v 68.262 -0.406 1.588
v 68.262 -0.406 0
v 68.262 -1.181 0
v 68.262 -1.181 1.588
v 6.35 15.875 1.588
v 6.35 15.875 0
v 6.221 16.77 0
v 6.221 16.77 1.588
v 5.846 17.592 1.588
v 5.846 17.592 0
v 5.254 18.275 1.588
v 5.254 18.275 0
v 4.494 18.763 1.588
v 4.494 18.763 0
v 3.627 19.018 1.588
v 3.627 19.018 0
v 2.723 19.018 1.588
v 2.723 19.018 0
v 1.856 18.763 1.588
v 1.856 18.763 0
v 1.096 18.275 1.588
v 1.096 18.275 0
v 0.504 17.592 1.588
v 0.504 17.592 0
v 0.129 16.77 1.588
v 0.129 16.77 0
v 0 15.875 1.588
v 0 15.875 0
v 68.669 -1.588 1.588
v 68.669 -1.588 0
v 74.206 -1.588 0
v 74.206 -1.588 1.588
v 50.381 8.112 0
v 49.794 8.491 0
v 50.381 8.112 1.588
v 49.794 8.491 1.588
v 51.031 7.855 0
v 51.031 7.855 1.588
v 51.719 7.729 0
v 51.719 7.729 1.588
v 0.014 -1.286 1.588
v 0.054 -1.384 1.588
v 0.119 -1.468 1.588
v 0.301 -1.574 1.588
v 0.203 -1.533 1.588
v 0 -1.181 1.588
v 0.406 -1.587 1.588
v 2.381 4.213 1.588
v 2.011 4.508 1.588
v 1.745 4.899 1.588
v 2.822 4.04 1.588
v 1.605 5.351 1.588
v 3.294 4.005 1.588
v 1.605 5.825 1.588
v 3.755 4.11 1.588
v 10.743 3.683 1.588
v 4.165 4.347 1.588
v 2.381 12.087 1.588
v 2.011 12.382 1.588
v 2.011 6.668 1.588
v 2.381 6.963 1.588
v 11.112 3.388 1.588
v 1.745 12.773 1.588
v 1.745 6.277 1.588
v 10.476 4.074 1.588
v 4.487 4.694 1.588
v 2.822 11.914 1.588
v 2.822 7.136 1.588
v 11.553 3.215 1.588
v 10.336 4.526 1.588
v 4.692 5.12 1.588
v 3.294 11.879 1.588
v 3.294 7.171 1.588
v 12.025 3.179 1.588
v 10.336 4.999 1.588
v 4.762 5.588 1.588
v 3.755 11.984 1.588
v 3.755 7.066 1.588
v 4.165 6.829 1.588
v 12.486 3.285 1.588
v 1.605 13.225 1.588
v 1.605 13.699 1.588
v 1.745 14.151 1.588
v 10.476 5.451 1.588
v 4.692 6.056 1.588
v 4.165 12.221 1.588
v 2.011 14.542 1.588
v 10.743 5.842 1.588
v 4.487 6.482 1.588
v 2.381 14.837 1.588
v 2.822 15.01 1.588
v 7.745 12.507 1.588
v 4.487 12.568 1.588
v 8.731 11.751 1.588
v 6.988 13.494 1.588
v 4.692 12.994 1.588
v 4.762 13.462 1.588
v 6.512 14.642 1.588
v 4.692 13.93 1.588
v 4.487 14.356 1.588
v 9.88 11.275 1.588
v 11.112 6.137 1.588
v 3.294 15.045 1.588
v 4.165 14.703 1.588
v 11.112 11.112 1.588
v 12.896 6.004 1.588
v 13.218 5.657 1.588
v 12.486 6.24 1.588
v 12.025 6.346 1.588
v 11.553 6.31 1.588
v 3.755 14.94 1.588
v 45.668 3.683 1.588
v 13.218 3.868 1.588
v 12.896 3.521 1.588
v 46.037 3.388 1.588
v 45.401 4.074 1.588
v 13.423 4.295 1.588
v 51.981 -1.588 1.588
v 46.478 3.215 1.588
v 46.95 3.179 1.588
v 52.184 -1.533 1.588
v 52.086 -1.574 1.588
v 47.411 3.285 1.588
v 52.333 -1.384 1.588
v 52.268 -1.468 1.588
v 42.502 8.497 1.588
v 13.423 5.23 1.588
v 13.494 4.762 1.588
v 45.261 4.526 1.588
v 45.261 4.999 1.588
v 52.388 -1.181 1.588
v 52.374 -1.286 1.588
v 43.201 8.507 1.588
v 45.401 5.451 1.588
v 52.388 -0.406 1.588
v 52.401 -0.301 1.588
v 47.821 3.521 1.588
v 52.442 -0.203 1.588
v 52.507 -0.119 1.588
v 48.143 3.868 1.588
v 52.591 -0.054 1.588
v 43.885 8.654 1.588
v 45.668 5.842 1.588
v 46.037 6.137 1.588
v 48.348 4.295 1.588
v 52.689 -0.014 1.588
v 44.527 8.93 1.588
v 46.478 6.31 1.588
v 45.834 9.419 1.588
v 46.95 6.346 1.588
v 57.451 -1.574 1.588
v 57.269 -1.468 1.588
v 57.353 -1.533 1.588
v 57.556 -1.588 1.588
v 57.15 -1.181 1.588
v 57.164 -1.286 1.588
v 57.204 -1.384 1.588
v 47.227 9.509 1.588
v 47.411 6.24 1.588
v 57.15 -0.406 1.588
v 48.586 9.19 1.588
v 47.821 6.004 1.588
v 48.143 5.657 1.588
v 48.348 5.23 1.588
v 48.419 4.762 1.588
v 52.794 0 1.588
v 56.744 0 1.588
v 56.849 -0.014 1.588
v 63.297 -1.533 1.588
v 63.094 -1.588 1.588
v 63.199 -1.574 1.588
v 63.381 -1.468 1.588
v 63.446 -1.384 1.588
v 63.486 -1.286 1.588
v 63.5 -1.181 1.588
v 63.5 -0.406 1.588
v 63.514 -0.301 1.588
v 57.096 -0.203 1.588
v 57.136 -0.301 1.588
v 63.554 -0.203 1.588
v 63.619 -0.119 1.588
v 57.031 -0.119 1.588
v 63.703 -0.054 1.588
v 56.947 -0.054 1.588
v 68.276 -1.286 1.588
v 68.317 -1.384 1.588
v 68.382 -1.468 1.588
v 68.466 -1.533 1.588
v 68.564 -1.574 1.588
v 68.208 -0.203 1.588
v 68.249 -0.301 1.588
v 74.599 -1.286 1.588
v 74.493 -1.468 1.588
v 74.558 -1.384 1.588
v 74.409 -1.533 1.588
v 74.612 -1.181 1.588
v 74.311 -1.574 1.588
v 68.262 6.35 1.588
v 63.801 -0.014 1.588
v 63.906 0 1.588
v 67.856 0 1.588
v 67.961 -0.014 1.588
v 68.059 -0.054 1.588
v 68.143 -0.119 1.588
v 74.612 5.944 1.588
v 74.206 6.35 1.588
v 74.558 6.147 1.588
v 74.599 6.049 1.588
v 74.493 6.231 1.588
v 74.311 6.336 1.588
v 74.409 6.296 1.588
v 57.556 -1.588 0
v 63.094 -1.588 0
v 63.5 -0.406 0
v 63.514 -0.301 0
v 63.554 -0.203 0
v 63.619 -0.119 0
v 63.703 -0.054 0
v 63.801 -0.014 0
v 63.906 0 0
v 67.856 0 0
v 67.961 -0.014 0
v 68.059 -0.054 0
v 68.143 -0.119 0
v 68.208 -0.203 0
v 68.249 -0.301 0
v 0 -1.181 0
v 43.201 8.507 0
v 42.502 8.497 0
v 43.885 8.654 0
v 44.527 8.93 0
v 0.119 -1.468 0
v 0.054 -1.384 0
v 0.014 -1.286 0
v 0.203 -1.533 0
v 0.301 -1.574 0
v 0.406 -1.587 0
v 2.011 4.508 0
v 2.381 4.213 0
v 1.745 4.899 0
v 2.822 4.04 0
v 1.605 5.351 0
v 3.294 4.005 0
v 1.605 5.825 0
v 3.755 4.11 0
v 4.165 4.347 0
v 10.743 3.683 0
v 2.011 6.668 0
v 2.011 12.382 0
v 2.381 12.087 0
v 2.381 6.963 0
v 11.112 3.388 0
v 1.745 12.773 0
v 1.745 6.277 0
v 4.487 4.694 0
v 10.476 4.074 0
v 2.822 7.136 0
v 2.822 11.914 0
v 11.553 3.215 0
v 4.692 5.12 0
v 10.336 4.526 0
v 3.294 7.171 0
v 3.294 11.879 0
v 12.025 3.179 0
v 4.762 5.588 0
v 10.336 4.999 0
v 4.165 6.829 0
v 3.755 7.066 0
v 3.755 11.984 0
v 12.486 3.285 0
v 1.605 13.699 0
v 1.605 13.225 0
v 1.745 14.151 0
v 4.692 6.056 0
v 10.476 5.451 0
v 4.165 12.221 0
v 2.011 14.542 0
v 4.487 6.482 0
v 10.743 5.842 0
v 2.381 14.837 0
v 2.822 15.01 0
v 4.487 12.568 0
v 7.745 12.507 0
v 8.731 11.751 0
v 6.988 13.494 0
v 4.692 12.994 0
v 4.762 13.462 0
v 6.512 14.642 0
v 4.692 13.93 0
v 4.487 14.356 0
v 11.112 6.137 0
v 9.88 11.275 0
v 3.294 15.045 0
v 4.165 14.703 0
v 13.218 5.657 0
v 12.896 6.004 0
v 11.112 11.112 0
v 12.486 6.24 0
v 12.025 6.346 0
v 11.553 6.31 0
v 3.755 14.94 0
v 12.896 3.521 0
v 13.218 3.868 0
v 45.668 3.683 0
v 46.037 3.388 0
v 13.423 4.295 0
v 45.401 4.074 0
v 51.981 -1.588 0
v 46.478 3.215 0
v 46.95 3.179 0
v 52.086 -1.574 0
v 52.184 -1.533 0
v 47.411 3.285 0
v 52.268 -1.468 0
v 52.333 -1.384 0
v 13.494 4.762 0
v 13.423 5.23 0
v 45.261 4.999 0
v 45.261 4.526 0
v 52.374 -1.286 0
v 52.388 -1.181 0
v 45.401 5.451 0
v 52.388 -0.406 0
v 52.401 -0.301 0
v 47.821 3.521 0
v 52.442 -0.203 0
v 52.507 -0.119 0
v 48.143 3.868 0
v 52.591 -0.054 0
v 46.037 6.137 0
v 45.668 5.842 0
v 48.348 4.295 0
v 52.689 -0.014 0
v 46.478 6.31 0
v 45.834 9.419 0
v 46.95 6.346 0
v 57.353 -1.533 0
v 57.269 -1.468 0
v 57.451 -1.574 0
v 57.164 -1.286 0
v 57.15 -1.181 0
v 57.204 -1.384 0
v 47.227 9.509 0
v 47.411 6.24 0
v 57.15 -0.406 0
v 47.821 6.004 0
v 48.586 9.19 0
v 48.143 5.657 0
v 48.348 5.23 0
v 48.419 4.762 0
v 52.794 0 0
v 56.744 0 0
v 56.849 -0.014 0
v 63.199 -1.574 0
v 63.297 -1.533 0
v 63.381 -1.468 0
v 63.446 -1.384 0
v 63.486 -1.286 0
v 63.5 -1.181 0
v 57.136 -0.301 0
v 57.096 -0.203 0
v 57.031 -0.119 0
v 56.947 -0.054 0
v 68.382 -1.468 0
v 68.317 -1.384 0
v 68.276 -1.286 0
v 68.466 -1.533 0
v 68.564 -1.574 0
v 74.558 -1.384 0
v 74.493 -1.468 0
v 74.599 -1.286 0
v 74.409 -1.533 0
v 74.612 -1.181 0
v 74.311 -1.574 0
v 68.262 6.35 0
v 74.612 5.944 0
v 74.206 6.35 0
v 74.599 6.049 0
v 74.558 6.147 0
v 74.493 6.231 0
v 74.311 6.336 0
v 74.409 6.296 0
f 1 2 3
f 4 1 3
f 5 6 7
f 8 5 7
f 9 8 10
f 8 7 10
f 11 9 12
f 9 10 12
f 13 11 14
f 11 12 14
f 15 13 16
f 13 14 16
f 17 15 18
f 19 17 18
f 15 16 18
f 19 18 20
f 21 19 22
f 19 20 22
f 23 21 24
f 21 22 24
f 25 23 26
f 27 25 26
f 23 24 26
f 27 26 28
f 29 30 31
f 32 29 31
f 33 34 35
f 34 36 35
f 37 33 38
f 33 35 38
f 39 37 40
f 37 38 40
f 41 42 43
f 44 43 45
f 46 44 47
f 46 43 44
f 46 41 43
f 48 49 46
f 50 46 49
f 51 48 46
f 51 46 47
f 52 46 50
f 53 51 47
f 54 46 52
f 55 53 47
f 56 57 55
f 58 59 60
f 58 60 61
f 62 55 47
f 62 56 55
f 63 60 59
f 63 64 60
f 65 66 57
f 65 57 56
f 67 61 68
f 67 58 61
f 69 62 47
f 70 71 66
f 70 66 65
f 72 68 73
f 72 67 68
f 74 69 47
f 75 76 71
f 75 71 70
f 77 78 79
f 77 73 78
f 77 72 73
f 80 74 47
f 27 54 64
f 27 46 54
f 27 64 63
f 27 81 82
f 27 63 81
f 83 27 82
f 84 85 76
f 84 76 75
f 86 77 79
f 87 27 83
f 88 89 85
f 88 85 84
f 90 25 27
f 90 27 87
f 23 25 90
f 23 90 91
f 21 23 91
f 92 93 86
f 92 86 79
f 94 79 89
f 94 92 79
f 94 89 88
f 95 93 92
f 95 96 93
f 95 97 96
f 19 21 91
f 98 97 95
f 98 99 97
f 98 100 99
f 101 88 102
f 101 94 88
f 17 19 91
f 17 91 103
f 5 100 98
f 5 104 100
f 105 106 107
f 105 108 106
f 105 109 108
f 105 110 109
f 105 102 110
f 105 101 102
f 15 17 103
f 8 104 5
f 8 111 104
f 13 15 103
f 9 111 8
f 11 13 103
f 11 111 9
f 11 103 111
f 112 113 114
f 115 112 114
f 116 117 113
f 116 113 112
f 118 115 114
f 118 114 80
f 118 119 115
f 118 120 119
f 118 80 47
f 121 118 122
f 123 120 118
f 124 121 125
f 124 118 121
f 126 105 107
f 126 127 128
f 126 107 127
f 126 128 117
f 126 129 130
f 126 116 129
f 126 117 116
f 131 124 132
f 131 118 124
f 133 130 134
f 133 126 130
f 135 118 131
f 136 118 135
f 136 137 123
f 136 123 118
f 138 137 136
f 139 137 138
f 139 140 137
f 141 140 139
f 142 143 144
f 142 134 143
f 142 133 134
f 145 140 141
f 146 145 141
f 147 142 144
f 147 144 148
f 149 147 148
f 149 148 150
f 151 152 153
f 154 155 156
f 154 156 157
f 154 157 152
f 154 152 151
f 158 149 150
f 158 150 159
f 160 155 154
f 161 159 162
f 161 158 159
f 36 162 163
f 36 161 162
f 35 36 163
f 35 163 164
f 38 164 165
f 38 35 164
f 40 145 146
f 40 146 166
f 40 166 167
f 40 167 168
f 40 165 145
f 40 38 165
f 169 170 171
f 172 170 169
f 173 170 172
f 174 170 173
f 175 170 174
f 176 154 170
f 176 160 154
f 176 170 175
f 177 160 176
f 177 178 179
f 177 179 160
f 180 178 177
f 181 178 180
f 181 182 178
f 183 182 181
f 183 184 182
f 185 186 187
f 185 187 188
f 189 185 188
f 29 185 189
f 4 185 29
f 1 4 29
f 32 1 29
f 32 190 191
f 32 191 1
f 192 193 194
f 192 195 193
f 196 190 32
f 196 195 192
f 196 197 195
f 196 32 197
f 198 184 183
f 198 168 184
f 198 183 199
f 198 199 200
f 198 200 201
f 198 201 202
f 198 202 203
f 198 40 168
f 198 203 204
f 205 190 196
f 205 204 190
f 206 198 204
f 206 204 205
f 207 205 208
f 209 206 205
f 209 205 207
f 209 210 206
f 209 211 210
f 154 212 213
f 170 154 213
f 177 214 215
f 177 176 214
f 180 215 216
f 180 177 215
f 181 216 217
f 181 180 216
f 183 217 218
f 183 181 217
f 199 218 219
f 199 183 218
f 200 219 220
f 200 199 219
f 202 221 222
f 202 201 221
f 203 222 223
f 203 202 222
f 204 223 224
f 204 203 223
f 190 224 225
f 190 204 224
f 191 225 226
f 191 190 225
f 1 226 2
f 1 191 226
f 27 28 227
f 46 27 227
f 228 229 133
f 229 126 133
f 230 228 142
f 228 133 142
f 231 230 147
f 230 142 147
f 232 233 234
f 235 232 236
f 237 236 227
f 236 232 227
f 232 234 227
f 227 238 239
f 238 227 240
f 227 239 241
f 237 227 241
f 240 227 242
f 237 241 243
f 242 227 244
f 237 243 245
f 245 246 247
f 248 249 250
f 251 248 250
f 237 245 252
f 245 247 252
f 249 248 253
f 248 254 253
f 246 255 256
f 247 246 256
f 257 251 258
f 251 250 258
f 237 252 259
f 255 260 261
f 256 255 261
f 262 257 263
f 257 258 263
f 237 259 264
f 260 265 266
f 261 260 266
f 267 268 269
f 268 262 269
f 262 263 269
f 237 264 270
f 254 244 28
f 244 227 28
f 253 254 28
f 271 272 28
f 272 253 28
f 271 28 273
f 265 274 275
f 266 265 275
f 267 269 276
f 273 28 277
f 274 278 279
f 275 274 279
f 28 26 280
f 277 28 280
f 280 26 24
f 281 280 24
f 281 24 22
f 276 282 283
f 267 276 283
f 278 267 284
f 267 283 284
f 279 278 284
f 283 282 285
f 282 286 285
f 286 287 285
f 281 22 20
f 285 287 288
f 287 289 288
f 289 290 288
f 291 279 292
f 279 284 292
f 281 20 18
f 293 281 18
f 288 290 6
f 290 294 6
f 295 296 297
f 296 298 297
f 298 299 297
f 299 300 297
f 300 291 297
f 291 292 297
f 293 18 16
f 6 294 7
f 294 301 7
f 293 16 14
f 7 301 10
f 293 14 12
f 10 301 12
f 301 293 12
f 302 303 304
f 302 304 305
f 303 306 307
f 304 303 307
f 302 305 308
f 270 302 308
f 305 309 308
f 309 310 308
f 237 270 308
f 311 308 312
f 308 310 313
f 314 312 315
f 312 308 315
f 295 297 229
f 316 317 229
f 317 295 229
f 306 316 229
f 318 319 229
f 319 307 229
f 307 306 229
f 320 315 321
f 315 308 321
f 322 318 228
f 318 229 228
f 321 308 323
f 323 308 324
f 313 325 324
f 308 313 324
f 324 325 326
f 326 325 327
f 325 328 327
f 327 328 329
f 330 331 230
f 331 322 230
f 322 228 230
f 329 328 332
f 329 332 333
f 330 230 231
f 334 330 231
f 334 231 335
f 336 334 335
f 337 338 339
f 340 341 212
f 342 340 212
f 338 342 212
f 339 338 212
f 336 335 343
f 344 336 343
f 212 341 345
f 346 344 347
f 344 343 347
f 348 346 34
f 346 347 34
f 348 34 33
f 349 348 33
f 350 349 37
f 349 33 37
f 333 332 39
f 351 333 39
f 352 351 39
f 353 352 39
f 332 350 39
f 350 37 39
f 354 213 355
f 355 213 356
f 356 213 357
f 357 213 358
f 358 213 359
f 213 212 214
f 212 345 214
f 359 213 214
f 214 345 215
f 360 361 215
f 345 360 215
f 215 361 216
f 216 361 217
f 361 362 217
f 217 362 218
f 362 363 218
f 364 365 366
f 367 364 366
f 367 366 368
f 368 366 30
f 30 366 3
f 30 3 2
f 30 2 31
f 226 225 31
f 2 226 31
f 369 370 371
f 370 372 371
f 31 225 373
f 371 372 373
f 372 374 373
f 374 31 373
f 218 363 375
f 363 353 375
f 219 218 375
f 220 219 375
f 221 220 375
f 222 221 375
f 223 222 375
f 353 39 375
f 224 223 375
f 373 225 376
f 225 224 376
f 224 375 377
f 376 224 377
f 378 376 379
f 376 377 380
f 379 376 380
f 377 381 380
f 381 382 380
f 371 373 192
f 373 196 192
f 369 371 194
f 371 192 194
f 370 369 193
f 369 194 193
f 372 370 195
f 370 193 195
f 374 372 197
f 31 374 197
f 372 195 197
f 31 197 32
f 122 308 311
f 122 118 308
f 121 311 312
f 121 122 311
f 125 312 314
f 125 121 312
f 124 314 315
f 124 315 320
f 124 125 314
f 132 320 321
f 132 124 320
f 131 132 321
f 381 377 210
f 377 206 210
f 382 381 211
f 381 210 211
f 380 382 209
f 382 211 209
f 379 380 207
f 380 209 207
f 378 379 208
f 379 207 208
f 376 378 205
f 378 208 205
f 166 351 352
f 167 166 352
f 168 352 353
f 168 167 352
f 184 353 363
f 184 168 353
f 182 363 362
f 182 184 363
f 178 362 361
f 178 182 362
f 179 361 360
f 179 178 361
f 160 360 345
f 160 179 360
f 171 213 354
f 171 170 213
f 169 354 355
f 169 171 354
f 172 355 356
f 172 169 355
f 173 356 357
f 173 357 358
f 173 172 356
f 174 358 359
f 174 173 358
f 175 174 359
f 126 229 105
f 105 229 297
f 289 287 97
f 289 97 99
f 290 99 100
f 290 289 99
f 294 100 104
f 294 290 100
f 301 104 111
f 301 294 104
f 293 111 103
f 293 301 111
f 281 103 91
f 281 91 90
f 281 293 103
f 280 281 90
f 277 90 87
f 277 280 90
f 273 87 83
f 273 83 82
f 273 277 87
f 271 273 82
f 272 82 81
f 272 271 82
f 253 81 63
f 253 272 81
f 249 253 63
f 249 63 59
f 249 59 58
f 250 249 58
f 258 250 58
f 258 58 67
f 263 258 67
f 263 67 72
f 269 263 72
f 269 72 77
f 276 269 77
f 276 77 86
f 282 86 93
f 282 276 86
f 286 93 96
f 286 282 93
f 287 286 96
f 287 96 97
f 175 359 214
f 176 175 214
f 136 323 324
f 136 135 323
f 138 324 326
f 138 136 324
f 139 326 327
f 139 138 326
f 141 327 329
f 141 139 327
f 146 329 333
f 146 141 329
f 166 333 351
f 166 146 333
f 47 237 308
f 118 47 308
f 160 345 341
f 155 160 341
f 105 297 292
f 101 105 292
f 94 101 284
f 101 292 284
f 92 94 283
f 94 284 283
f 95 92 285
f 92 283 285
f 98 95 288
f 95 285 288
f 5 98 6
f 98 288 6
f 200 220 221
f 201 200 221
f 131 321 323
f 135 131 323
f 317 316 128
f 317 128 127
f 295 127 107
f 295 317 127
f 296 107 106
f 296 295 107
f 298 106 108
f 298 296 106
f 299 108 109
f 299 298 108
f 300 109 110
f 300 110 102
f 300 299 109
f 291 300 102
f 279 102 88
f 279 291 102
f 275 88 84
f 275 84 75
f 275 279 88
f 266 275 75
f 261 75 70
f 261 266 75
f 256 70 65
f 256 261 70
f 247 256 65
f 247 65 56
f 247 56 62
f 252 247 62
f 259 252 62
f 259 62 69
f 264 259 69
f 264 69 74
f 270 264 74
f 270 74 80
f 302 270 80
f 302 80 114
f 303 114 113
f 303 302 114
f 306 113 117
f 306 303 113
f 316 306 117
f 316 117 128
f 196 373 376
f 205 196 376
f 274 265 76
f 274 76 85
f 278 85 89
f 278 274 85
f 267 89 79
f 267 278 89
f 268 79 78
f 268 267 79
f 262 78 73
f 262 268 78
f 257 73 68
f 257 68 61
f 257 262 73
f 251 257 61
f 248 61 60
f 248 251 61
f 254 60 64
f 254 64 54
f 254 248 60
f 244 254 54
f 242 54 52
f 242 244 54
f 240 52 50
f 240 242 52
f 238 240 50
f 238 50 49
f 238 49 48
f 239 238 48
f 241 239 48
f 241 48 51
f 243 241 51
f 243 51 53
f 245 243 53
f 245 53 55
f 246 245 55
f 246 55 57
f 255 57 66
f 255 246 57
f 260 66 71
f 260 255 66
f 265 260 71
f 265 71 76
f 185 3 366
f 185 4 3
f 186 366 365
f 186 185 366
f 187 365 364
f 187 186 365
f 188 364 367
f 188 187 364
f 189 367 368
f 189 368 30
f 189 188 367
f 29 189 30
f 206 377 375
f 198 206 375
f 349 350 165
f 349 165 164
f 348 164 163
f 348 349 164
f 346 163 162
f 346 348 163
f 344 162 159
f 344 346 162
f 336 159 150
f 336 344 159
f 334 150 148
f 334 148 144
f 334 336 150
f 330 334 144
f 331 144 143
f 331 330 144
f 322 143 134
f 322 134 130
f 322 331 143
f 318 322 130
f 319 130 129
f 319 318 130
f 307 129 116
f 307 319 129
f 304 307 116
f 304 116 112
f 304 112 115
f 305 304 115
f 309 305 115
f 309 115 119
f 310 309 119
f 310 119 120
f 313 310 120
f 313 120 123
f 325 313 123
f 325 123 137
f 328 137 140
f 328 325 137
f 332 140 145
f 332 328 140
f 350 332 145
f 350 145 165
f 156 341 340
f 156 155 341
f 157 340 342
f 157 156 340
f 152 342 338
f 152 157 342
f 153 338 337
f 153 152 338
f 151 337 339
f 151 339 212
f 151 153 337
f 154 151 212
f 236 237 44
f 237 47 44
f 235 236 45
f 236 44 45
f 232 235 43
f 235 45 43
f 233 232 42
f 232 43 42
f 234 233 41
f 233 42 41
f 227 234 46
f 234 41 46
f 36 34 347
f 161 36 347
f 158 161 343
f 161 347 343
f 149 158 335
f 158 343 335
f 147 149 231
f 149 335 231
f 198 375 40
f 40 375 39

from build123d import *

# Parameters (mm, degrees)
SKETCH1_R           = 1.5875
BOSS_EXTRUDE1_DEPTH = 1.5875
FILLET1_R           = 0.4064
FILLET2_R           = 3.571875


with BuildPart() as part:
    # Sketch1 → Boss-Extrude1 (new body)
    with BuildSketch(Plane.XY):
        with BuildLine():
            Line((0, -1.5875), (52.3875, -1.5875))
            Line((52.3875, -1.5875), (52.3875, 0))
            Line((52.3875, 0), (57.15, 0))
            Line((57.15, 0), (57.15, -1.5875))
            Line((57.15, -1.5875), (63.5, -1.5875))
            Line((63.5, -1.5875), (63.5, 0))
            Line((63.5, 0), (68.2625, 0))
            Line((68.2625, 0), (68.2625, -1.5875))
            Line((68.2625, -1.5875), (74.6125, -1.5875))
            Line((74.6125, -1.5875), (74.6125, 6.35))
            Line((74.6125, 6.35), (68.2625, 6.35))
            Line((68.2625, 6.35), (50.472175754, 7.832527021))
            ThreePointArc((50.472175754, 7.832527021), (47.226754098, 9.508549174), (43.748686315, 8.392817807))
            Line((43.748686315, 8.392817807), (11.1125, 11.1125))
            ThreePointArc((11.1125, 11.1125), (7.744903955, 12.507403955), (6.35, 15.875))
            ThreePointArc((6.35, 15.875), (3.175, 19.05), (0, 15.875))
            Line((0, 15.875), (0, -1.5875))
        make_face()
        with Locations((3.175, 5.588)):
            Circle(SKETCH1_R, mode=Mode.SUBTRACT)
        with Locations((3.175, 13.462)):
            Circle(SKETCH1_R, mode=Mode.SUBTRACT)
        with Locations((11.90625, 4.7625)):
            Circle(SKETCH1_R, mode=Mode.SUBTRACT)
        with Locations((46.83125, 4.7625)):
            Circle(SKETCH1_R, mode=Mode.SUBTRACT)
    extrude(amount=BOSS_EXTRUDE1_DEPTH)

    # Fillet1
    fillet1_edges = [part.edges().sort_by_distance(p)[0] for p in [
        (68.2625, 6.35, 0.79375),
        (74.6125, 6.35, 0.79375),
        (74.6125, -1.5875, 0.79375),
        (68.2625, -1.5875, 0.79375),
        (68.2625, 0, 0.79375),
        (63.5, 0, 0.79375),
        (63.5, -1.5875, 0.79375),
        (57.15, -1.5875, 0.79375),
        (57.15, 0, 0.79375),
        (52.3875, 0, 0.79375),
        (52.3875, -1.5875, 0.79375),
        (0, -1.5875, 0.79375),
    ]]
    fillet(fillet1_edges, radius=FILLET1_R)

    # Fillet2
    fillet2_edges = [part.edges().sort_by_distance(p)[0] for p in [
        (43.748686315, 8.392817807, 0.79375),
        (50.472175754, 7.832527021, 0.79375),
    ]]
    fillet(fillet2_edges, radius=FILLET2_R)


solid = part.part
